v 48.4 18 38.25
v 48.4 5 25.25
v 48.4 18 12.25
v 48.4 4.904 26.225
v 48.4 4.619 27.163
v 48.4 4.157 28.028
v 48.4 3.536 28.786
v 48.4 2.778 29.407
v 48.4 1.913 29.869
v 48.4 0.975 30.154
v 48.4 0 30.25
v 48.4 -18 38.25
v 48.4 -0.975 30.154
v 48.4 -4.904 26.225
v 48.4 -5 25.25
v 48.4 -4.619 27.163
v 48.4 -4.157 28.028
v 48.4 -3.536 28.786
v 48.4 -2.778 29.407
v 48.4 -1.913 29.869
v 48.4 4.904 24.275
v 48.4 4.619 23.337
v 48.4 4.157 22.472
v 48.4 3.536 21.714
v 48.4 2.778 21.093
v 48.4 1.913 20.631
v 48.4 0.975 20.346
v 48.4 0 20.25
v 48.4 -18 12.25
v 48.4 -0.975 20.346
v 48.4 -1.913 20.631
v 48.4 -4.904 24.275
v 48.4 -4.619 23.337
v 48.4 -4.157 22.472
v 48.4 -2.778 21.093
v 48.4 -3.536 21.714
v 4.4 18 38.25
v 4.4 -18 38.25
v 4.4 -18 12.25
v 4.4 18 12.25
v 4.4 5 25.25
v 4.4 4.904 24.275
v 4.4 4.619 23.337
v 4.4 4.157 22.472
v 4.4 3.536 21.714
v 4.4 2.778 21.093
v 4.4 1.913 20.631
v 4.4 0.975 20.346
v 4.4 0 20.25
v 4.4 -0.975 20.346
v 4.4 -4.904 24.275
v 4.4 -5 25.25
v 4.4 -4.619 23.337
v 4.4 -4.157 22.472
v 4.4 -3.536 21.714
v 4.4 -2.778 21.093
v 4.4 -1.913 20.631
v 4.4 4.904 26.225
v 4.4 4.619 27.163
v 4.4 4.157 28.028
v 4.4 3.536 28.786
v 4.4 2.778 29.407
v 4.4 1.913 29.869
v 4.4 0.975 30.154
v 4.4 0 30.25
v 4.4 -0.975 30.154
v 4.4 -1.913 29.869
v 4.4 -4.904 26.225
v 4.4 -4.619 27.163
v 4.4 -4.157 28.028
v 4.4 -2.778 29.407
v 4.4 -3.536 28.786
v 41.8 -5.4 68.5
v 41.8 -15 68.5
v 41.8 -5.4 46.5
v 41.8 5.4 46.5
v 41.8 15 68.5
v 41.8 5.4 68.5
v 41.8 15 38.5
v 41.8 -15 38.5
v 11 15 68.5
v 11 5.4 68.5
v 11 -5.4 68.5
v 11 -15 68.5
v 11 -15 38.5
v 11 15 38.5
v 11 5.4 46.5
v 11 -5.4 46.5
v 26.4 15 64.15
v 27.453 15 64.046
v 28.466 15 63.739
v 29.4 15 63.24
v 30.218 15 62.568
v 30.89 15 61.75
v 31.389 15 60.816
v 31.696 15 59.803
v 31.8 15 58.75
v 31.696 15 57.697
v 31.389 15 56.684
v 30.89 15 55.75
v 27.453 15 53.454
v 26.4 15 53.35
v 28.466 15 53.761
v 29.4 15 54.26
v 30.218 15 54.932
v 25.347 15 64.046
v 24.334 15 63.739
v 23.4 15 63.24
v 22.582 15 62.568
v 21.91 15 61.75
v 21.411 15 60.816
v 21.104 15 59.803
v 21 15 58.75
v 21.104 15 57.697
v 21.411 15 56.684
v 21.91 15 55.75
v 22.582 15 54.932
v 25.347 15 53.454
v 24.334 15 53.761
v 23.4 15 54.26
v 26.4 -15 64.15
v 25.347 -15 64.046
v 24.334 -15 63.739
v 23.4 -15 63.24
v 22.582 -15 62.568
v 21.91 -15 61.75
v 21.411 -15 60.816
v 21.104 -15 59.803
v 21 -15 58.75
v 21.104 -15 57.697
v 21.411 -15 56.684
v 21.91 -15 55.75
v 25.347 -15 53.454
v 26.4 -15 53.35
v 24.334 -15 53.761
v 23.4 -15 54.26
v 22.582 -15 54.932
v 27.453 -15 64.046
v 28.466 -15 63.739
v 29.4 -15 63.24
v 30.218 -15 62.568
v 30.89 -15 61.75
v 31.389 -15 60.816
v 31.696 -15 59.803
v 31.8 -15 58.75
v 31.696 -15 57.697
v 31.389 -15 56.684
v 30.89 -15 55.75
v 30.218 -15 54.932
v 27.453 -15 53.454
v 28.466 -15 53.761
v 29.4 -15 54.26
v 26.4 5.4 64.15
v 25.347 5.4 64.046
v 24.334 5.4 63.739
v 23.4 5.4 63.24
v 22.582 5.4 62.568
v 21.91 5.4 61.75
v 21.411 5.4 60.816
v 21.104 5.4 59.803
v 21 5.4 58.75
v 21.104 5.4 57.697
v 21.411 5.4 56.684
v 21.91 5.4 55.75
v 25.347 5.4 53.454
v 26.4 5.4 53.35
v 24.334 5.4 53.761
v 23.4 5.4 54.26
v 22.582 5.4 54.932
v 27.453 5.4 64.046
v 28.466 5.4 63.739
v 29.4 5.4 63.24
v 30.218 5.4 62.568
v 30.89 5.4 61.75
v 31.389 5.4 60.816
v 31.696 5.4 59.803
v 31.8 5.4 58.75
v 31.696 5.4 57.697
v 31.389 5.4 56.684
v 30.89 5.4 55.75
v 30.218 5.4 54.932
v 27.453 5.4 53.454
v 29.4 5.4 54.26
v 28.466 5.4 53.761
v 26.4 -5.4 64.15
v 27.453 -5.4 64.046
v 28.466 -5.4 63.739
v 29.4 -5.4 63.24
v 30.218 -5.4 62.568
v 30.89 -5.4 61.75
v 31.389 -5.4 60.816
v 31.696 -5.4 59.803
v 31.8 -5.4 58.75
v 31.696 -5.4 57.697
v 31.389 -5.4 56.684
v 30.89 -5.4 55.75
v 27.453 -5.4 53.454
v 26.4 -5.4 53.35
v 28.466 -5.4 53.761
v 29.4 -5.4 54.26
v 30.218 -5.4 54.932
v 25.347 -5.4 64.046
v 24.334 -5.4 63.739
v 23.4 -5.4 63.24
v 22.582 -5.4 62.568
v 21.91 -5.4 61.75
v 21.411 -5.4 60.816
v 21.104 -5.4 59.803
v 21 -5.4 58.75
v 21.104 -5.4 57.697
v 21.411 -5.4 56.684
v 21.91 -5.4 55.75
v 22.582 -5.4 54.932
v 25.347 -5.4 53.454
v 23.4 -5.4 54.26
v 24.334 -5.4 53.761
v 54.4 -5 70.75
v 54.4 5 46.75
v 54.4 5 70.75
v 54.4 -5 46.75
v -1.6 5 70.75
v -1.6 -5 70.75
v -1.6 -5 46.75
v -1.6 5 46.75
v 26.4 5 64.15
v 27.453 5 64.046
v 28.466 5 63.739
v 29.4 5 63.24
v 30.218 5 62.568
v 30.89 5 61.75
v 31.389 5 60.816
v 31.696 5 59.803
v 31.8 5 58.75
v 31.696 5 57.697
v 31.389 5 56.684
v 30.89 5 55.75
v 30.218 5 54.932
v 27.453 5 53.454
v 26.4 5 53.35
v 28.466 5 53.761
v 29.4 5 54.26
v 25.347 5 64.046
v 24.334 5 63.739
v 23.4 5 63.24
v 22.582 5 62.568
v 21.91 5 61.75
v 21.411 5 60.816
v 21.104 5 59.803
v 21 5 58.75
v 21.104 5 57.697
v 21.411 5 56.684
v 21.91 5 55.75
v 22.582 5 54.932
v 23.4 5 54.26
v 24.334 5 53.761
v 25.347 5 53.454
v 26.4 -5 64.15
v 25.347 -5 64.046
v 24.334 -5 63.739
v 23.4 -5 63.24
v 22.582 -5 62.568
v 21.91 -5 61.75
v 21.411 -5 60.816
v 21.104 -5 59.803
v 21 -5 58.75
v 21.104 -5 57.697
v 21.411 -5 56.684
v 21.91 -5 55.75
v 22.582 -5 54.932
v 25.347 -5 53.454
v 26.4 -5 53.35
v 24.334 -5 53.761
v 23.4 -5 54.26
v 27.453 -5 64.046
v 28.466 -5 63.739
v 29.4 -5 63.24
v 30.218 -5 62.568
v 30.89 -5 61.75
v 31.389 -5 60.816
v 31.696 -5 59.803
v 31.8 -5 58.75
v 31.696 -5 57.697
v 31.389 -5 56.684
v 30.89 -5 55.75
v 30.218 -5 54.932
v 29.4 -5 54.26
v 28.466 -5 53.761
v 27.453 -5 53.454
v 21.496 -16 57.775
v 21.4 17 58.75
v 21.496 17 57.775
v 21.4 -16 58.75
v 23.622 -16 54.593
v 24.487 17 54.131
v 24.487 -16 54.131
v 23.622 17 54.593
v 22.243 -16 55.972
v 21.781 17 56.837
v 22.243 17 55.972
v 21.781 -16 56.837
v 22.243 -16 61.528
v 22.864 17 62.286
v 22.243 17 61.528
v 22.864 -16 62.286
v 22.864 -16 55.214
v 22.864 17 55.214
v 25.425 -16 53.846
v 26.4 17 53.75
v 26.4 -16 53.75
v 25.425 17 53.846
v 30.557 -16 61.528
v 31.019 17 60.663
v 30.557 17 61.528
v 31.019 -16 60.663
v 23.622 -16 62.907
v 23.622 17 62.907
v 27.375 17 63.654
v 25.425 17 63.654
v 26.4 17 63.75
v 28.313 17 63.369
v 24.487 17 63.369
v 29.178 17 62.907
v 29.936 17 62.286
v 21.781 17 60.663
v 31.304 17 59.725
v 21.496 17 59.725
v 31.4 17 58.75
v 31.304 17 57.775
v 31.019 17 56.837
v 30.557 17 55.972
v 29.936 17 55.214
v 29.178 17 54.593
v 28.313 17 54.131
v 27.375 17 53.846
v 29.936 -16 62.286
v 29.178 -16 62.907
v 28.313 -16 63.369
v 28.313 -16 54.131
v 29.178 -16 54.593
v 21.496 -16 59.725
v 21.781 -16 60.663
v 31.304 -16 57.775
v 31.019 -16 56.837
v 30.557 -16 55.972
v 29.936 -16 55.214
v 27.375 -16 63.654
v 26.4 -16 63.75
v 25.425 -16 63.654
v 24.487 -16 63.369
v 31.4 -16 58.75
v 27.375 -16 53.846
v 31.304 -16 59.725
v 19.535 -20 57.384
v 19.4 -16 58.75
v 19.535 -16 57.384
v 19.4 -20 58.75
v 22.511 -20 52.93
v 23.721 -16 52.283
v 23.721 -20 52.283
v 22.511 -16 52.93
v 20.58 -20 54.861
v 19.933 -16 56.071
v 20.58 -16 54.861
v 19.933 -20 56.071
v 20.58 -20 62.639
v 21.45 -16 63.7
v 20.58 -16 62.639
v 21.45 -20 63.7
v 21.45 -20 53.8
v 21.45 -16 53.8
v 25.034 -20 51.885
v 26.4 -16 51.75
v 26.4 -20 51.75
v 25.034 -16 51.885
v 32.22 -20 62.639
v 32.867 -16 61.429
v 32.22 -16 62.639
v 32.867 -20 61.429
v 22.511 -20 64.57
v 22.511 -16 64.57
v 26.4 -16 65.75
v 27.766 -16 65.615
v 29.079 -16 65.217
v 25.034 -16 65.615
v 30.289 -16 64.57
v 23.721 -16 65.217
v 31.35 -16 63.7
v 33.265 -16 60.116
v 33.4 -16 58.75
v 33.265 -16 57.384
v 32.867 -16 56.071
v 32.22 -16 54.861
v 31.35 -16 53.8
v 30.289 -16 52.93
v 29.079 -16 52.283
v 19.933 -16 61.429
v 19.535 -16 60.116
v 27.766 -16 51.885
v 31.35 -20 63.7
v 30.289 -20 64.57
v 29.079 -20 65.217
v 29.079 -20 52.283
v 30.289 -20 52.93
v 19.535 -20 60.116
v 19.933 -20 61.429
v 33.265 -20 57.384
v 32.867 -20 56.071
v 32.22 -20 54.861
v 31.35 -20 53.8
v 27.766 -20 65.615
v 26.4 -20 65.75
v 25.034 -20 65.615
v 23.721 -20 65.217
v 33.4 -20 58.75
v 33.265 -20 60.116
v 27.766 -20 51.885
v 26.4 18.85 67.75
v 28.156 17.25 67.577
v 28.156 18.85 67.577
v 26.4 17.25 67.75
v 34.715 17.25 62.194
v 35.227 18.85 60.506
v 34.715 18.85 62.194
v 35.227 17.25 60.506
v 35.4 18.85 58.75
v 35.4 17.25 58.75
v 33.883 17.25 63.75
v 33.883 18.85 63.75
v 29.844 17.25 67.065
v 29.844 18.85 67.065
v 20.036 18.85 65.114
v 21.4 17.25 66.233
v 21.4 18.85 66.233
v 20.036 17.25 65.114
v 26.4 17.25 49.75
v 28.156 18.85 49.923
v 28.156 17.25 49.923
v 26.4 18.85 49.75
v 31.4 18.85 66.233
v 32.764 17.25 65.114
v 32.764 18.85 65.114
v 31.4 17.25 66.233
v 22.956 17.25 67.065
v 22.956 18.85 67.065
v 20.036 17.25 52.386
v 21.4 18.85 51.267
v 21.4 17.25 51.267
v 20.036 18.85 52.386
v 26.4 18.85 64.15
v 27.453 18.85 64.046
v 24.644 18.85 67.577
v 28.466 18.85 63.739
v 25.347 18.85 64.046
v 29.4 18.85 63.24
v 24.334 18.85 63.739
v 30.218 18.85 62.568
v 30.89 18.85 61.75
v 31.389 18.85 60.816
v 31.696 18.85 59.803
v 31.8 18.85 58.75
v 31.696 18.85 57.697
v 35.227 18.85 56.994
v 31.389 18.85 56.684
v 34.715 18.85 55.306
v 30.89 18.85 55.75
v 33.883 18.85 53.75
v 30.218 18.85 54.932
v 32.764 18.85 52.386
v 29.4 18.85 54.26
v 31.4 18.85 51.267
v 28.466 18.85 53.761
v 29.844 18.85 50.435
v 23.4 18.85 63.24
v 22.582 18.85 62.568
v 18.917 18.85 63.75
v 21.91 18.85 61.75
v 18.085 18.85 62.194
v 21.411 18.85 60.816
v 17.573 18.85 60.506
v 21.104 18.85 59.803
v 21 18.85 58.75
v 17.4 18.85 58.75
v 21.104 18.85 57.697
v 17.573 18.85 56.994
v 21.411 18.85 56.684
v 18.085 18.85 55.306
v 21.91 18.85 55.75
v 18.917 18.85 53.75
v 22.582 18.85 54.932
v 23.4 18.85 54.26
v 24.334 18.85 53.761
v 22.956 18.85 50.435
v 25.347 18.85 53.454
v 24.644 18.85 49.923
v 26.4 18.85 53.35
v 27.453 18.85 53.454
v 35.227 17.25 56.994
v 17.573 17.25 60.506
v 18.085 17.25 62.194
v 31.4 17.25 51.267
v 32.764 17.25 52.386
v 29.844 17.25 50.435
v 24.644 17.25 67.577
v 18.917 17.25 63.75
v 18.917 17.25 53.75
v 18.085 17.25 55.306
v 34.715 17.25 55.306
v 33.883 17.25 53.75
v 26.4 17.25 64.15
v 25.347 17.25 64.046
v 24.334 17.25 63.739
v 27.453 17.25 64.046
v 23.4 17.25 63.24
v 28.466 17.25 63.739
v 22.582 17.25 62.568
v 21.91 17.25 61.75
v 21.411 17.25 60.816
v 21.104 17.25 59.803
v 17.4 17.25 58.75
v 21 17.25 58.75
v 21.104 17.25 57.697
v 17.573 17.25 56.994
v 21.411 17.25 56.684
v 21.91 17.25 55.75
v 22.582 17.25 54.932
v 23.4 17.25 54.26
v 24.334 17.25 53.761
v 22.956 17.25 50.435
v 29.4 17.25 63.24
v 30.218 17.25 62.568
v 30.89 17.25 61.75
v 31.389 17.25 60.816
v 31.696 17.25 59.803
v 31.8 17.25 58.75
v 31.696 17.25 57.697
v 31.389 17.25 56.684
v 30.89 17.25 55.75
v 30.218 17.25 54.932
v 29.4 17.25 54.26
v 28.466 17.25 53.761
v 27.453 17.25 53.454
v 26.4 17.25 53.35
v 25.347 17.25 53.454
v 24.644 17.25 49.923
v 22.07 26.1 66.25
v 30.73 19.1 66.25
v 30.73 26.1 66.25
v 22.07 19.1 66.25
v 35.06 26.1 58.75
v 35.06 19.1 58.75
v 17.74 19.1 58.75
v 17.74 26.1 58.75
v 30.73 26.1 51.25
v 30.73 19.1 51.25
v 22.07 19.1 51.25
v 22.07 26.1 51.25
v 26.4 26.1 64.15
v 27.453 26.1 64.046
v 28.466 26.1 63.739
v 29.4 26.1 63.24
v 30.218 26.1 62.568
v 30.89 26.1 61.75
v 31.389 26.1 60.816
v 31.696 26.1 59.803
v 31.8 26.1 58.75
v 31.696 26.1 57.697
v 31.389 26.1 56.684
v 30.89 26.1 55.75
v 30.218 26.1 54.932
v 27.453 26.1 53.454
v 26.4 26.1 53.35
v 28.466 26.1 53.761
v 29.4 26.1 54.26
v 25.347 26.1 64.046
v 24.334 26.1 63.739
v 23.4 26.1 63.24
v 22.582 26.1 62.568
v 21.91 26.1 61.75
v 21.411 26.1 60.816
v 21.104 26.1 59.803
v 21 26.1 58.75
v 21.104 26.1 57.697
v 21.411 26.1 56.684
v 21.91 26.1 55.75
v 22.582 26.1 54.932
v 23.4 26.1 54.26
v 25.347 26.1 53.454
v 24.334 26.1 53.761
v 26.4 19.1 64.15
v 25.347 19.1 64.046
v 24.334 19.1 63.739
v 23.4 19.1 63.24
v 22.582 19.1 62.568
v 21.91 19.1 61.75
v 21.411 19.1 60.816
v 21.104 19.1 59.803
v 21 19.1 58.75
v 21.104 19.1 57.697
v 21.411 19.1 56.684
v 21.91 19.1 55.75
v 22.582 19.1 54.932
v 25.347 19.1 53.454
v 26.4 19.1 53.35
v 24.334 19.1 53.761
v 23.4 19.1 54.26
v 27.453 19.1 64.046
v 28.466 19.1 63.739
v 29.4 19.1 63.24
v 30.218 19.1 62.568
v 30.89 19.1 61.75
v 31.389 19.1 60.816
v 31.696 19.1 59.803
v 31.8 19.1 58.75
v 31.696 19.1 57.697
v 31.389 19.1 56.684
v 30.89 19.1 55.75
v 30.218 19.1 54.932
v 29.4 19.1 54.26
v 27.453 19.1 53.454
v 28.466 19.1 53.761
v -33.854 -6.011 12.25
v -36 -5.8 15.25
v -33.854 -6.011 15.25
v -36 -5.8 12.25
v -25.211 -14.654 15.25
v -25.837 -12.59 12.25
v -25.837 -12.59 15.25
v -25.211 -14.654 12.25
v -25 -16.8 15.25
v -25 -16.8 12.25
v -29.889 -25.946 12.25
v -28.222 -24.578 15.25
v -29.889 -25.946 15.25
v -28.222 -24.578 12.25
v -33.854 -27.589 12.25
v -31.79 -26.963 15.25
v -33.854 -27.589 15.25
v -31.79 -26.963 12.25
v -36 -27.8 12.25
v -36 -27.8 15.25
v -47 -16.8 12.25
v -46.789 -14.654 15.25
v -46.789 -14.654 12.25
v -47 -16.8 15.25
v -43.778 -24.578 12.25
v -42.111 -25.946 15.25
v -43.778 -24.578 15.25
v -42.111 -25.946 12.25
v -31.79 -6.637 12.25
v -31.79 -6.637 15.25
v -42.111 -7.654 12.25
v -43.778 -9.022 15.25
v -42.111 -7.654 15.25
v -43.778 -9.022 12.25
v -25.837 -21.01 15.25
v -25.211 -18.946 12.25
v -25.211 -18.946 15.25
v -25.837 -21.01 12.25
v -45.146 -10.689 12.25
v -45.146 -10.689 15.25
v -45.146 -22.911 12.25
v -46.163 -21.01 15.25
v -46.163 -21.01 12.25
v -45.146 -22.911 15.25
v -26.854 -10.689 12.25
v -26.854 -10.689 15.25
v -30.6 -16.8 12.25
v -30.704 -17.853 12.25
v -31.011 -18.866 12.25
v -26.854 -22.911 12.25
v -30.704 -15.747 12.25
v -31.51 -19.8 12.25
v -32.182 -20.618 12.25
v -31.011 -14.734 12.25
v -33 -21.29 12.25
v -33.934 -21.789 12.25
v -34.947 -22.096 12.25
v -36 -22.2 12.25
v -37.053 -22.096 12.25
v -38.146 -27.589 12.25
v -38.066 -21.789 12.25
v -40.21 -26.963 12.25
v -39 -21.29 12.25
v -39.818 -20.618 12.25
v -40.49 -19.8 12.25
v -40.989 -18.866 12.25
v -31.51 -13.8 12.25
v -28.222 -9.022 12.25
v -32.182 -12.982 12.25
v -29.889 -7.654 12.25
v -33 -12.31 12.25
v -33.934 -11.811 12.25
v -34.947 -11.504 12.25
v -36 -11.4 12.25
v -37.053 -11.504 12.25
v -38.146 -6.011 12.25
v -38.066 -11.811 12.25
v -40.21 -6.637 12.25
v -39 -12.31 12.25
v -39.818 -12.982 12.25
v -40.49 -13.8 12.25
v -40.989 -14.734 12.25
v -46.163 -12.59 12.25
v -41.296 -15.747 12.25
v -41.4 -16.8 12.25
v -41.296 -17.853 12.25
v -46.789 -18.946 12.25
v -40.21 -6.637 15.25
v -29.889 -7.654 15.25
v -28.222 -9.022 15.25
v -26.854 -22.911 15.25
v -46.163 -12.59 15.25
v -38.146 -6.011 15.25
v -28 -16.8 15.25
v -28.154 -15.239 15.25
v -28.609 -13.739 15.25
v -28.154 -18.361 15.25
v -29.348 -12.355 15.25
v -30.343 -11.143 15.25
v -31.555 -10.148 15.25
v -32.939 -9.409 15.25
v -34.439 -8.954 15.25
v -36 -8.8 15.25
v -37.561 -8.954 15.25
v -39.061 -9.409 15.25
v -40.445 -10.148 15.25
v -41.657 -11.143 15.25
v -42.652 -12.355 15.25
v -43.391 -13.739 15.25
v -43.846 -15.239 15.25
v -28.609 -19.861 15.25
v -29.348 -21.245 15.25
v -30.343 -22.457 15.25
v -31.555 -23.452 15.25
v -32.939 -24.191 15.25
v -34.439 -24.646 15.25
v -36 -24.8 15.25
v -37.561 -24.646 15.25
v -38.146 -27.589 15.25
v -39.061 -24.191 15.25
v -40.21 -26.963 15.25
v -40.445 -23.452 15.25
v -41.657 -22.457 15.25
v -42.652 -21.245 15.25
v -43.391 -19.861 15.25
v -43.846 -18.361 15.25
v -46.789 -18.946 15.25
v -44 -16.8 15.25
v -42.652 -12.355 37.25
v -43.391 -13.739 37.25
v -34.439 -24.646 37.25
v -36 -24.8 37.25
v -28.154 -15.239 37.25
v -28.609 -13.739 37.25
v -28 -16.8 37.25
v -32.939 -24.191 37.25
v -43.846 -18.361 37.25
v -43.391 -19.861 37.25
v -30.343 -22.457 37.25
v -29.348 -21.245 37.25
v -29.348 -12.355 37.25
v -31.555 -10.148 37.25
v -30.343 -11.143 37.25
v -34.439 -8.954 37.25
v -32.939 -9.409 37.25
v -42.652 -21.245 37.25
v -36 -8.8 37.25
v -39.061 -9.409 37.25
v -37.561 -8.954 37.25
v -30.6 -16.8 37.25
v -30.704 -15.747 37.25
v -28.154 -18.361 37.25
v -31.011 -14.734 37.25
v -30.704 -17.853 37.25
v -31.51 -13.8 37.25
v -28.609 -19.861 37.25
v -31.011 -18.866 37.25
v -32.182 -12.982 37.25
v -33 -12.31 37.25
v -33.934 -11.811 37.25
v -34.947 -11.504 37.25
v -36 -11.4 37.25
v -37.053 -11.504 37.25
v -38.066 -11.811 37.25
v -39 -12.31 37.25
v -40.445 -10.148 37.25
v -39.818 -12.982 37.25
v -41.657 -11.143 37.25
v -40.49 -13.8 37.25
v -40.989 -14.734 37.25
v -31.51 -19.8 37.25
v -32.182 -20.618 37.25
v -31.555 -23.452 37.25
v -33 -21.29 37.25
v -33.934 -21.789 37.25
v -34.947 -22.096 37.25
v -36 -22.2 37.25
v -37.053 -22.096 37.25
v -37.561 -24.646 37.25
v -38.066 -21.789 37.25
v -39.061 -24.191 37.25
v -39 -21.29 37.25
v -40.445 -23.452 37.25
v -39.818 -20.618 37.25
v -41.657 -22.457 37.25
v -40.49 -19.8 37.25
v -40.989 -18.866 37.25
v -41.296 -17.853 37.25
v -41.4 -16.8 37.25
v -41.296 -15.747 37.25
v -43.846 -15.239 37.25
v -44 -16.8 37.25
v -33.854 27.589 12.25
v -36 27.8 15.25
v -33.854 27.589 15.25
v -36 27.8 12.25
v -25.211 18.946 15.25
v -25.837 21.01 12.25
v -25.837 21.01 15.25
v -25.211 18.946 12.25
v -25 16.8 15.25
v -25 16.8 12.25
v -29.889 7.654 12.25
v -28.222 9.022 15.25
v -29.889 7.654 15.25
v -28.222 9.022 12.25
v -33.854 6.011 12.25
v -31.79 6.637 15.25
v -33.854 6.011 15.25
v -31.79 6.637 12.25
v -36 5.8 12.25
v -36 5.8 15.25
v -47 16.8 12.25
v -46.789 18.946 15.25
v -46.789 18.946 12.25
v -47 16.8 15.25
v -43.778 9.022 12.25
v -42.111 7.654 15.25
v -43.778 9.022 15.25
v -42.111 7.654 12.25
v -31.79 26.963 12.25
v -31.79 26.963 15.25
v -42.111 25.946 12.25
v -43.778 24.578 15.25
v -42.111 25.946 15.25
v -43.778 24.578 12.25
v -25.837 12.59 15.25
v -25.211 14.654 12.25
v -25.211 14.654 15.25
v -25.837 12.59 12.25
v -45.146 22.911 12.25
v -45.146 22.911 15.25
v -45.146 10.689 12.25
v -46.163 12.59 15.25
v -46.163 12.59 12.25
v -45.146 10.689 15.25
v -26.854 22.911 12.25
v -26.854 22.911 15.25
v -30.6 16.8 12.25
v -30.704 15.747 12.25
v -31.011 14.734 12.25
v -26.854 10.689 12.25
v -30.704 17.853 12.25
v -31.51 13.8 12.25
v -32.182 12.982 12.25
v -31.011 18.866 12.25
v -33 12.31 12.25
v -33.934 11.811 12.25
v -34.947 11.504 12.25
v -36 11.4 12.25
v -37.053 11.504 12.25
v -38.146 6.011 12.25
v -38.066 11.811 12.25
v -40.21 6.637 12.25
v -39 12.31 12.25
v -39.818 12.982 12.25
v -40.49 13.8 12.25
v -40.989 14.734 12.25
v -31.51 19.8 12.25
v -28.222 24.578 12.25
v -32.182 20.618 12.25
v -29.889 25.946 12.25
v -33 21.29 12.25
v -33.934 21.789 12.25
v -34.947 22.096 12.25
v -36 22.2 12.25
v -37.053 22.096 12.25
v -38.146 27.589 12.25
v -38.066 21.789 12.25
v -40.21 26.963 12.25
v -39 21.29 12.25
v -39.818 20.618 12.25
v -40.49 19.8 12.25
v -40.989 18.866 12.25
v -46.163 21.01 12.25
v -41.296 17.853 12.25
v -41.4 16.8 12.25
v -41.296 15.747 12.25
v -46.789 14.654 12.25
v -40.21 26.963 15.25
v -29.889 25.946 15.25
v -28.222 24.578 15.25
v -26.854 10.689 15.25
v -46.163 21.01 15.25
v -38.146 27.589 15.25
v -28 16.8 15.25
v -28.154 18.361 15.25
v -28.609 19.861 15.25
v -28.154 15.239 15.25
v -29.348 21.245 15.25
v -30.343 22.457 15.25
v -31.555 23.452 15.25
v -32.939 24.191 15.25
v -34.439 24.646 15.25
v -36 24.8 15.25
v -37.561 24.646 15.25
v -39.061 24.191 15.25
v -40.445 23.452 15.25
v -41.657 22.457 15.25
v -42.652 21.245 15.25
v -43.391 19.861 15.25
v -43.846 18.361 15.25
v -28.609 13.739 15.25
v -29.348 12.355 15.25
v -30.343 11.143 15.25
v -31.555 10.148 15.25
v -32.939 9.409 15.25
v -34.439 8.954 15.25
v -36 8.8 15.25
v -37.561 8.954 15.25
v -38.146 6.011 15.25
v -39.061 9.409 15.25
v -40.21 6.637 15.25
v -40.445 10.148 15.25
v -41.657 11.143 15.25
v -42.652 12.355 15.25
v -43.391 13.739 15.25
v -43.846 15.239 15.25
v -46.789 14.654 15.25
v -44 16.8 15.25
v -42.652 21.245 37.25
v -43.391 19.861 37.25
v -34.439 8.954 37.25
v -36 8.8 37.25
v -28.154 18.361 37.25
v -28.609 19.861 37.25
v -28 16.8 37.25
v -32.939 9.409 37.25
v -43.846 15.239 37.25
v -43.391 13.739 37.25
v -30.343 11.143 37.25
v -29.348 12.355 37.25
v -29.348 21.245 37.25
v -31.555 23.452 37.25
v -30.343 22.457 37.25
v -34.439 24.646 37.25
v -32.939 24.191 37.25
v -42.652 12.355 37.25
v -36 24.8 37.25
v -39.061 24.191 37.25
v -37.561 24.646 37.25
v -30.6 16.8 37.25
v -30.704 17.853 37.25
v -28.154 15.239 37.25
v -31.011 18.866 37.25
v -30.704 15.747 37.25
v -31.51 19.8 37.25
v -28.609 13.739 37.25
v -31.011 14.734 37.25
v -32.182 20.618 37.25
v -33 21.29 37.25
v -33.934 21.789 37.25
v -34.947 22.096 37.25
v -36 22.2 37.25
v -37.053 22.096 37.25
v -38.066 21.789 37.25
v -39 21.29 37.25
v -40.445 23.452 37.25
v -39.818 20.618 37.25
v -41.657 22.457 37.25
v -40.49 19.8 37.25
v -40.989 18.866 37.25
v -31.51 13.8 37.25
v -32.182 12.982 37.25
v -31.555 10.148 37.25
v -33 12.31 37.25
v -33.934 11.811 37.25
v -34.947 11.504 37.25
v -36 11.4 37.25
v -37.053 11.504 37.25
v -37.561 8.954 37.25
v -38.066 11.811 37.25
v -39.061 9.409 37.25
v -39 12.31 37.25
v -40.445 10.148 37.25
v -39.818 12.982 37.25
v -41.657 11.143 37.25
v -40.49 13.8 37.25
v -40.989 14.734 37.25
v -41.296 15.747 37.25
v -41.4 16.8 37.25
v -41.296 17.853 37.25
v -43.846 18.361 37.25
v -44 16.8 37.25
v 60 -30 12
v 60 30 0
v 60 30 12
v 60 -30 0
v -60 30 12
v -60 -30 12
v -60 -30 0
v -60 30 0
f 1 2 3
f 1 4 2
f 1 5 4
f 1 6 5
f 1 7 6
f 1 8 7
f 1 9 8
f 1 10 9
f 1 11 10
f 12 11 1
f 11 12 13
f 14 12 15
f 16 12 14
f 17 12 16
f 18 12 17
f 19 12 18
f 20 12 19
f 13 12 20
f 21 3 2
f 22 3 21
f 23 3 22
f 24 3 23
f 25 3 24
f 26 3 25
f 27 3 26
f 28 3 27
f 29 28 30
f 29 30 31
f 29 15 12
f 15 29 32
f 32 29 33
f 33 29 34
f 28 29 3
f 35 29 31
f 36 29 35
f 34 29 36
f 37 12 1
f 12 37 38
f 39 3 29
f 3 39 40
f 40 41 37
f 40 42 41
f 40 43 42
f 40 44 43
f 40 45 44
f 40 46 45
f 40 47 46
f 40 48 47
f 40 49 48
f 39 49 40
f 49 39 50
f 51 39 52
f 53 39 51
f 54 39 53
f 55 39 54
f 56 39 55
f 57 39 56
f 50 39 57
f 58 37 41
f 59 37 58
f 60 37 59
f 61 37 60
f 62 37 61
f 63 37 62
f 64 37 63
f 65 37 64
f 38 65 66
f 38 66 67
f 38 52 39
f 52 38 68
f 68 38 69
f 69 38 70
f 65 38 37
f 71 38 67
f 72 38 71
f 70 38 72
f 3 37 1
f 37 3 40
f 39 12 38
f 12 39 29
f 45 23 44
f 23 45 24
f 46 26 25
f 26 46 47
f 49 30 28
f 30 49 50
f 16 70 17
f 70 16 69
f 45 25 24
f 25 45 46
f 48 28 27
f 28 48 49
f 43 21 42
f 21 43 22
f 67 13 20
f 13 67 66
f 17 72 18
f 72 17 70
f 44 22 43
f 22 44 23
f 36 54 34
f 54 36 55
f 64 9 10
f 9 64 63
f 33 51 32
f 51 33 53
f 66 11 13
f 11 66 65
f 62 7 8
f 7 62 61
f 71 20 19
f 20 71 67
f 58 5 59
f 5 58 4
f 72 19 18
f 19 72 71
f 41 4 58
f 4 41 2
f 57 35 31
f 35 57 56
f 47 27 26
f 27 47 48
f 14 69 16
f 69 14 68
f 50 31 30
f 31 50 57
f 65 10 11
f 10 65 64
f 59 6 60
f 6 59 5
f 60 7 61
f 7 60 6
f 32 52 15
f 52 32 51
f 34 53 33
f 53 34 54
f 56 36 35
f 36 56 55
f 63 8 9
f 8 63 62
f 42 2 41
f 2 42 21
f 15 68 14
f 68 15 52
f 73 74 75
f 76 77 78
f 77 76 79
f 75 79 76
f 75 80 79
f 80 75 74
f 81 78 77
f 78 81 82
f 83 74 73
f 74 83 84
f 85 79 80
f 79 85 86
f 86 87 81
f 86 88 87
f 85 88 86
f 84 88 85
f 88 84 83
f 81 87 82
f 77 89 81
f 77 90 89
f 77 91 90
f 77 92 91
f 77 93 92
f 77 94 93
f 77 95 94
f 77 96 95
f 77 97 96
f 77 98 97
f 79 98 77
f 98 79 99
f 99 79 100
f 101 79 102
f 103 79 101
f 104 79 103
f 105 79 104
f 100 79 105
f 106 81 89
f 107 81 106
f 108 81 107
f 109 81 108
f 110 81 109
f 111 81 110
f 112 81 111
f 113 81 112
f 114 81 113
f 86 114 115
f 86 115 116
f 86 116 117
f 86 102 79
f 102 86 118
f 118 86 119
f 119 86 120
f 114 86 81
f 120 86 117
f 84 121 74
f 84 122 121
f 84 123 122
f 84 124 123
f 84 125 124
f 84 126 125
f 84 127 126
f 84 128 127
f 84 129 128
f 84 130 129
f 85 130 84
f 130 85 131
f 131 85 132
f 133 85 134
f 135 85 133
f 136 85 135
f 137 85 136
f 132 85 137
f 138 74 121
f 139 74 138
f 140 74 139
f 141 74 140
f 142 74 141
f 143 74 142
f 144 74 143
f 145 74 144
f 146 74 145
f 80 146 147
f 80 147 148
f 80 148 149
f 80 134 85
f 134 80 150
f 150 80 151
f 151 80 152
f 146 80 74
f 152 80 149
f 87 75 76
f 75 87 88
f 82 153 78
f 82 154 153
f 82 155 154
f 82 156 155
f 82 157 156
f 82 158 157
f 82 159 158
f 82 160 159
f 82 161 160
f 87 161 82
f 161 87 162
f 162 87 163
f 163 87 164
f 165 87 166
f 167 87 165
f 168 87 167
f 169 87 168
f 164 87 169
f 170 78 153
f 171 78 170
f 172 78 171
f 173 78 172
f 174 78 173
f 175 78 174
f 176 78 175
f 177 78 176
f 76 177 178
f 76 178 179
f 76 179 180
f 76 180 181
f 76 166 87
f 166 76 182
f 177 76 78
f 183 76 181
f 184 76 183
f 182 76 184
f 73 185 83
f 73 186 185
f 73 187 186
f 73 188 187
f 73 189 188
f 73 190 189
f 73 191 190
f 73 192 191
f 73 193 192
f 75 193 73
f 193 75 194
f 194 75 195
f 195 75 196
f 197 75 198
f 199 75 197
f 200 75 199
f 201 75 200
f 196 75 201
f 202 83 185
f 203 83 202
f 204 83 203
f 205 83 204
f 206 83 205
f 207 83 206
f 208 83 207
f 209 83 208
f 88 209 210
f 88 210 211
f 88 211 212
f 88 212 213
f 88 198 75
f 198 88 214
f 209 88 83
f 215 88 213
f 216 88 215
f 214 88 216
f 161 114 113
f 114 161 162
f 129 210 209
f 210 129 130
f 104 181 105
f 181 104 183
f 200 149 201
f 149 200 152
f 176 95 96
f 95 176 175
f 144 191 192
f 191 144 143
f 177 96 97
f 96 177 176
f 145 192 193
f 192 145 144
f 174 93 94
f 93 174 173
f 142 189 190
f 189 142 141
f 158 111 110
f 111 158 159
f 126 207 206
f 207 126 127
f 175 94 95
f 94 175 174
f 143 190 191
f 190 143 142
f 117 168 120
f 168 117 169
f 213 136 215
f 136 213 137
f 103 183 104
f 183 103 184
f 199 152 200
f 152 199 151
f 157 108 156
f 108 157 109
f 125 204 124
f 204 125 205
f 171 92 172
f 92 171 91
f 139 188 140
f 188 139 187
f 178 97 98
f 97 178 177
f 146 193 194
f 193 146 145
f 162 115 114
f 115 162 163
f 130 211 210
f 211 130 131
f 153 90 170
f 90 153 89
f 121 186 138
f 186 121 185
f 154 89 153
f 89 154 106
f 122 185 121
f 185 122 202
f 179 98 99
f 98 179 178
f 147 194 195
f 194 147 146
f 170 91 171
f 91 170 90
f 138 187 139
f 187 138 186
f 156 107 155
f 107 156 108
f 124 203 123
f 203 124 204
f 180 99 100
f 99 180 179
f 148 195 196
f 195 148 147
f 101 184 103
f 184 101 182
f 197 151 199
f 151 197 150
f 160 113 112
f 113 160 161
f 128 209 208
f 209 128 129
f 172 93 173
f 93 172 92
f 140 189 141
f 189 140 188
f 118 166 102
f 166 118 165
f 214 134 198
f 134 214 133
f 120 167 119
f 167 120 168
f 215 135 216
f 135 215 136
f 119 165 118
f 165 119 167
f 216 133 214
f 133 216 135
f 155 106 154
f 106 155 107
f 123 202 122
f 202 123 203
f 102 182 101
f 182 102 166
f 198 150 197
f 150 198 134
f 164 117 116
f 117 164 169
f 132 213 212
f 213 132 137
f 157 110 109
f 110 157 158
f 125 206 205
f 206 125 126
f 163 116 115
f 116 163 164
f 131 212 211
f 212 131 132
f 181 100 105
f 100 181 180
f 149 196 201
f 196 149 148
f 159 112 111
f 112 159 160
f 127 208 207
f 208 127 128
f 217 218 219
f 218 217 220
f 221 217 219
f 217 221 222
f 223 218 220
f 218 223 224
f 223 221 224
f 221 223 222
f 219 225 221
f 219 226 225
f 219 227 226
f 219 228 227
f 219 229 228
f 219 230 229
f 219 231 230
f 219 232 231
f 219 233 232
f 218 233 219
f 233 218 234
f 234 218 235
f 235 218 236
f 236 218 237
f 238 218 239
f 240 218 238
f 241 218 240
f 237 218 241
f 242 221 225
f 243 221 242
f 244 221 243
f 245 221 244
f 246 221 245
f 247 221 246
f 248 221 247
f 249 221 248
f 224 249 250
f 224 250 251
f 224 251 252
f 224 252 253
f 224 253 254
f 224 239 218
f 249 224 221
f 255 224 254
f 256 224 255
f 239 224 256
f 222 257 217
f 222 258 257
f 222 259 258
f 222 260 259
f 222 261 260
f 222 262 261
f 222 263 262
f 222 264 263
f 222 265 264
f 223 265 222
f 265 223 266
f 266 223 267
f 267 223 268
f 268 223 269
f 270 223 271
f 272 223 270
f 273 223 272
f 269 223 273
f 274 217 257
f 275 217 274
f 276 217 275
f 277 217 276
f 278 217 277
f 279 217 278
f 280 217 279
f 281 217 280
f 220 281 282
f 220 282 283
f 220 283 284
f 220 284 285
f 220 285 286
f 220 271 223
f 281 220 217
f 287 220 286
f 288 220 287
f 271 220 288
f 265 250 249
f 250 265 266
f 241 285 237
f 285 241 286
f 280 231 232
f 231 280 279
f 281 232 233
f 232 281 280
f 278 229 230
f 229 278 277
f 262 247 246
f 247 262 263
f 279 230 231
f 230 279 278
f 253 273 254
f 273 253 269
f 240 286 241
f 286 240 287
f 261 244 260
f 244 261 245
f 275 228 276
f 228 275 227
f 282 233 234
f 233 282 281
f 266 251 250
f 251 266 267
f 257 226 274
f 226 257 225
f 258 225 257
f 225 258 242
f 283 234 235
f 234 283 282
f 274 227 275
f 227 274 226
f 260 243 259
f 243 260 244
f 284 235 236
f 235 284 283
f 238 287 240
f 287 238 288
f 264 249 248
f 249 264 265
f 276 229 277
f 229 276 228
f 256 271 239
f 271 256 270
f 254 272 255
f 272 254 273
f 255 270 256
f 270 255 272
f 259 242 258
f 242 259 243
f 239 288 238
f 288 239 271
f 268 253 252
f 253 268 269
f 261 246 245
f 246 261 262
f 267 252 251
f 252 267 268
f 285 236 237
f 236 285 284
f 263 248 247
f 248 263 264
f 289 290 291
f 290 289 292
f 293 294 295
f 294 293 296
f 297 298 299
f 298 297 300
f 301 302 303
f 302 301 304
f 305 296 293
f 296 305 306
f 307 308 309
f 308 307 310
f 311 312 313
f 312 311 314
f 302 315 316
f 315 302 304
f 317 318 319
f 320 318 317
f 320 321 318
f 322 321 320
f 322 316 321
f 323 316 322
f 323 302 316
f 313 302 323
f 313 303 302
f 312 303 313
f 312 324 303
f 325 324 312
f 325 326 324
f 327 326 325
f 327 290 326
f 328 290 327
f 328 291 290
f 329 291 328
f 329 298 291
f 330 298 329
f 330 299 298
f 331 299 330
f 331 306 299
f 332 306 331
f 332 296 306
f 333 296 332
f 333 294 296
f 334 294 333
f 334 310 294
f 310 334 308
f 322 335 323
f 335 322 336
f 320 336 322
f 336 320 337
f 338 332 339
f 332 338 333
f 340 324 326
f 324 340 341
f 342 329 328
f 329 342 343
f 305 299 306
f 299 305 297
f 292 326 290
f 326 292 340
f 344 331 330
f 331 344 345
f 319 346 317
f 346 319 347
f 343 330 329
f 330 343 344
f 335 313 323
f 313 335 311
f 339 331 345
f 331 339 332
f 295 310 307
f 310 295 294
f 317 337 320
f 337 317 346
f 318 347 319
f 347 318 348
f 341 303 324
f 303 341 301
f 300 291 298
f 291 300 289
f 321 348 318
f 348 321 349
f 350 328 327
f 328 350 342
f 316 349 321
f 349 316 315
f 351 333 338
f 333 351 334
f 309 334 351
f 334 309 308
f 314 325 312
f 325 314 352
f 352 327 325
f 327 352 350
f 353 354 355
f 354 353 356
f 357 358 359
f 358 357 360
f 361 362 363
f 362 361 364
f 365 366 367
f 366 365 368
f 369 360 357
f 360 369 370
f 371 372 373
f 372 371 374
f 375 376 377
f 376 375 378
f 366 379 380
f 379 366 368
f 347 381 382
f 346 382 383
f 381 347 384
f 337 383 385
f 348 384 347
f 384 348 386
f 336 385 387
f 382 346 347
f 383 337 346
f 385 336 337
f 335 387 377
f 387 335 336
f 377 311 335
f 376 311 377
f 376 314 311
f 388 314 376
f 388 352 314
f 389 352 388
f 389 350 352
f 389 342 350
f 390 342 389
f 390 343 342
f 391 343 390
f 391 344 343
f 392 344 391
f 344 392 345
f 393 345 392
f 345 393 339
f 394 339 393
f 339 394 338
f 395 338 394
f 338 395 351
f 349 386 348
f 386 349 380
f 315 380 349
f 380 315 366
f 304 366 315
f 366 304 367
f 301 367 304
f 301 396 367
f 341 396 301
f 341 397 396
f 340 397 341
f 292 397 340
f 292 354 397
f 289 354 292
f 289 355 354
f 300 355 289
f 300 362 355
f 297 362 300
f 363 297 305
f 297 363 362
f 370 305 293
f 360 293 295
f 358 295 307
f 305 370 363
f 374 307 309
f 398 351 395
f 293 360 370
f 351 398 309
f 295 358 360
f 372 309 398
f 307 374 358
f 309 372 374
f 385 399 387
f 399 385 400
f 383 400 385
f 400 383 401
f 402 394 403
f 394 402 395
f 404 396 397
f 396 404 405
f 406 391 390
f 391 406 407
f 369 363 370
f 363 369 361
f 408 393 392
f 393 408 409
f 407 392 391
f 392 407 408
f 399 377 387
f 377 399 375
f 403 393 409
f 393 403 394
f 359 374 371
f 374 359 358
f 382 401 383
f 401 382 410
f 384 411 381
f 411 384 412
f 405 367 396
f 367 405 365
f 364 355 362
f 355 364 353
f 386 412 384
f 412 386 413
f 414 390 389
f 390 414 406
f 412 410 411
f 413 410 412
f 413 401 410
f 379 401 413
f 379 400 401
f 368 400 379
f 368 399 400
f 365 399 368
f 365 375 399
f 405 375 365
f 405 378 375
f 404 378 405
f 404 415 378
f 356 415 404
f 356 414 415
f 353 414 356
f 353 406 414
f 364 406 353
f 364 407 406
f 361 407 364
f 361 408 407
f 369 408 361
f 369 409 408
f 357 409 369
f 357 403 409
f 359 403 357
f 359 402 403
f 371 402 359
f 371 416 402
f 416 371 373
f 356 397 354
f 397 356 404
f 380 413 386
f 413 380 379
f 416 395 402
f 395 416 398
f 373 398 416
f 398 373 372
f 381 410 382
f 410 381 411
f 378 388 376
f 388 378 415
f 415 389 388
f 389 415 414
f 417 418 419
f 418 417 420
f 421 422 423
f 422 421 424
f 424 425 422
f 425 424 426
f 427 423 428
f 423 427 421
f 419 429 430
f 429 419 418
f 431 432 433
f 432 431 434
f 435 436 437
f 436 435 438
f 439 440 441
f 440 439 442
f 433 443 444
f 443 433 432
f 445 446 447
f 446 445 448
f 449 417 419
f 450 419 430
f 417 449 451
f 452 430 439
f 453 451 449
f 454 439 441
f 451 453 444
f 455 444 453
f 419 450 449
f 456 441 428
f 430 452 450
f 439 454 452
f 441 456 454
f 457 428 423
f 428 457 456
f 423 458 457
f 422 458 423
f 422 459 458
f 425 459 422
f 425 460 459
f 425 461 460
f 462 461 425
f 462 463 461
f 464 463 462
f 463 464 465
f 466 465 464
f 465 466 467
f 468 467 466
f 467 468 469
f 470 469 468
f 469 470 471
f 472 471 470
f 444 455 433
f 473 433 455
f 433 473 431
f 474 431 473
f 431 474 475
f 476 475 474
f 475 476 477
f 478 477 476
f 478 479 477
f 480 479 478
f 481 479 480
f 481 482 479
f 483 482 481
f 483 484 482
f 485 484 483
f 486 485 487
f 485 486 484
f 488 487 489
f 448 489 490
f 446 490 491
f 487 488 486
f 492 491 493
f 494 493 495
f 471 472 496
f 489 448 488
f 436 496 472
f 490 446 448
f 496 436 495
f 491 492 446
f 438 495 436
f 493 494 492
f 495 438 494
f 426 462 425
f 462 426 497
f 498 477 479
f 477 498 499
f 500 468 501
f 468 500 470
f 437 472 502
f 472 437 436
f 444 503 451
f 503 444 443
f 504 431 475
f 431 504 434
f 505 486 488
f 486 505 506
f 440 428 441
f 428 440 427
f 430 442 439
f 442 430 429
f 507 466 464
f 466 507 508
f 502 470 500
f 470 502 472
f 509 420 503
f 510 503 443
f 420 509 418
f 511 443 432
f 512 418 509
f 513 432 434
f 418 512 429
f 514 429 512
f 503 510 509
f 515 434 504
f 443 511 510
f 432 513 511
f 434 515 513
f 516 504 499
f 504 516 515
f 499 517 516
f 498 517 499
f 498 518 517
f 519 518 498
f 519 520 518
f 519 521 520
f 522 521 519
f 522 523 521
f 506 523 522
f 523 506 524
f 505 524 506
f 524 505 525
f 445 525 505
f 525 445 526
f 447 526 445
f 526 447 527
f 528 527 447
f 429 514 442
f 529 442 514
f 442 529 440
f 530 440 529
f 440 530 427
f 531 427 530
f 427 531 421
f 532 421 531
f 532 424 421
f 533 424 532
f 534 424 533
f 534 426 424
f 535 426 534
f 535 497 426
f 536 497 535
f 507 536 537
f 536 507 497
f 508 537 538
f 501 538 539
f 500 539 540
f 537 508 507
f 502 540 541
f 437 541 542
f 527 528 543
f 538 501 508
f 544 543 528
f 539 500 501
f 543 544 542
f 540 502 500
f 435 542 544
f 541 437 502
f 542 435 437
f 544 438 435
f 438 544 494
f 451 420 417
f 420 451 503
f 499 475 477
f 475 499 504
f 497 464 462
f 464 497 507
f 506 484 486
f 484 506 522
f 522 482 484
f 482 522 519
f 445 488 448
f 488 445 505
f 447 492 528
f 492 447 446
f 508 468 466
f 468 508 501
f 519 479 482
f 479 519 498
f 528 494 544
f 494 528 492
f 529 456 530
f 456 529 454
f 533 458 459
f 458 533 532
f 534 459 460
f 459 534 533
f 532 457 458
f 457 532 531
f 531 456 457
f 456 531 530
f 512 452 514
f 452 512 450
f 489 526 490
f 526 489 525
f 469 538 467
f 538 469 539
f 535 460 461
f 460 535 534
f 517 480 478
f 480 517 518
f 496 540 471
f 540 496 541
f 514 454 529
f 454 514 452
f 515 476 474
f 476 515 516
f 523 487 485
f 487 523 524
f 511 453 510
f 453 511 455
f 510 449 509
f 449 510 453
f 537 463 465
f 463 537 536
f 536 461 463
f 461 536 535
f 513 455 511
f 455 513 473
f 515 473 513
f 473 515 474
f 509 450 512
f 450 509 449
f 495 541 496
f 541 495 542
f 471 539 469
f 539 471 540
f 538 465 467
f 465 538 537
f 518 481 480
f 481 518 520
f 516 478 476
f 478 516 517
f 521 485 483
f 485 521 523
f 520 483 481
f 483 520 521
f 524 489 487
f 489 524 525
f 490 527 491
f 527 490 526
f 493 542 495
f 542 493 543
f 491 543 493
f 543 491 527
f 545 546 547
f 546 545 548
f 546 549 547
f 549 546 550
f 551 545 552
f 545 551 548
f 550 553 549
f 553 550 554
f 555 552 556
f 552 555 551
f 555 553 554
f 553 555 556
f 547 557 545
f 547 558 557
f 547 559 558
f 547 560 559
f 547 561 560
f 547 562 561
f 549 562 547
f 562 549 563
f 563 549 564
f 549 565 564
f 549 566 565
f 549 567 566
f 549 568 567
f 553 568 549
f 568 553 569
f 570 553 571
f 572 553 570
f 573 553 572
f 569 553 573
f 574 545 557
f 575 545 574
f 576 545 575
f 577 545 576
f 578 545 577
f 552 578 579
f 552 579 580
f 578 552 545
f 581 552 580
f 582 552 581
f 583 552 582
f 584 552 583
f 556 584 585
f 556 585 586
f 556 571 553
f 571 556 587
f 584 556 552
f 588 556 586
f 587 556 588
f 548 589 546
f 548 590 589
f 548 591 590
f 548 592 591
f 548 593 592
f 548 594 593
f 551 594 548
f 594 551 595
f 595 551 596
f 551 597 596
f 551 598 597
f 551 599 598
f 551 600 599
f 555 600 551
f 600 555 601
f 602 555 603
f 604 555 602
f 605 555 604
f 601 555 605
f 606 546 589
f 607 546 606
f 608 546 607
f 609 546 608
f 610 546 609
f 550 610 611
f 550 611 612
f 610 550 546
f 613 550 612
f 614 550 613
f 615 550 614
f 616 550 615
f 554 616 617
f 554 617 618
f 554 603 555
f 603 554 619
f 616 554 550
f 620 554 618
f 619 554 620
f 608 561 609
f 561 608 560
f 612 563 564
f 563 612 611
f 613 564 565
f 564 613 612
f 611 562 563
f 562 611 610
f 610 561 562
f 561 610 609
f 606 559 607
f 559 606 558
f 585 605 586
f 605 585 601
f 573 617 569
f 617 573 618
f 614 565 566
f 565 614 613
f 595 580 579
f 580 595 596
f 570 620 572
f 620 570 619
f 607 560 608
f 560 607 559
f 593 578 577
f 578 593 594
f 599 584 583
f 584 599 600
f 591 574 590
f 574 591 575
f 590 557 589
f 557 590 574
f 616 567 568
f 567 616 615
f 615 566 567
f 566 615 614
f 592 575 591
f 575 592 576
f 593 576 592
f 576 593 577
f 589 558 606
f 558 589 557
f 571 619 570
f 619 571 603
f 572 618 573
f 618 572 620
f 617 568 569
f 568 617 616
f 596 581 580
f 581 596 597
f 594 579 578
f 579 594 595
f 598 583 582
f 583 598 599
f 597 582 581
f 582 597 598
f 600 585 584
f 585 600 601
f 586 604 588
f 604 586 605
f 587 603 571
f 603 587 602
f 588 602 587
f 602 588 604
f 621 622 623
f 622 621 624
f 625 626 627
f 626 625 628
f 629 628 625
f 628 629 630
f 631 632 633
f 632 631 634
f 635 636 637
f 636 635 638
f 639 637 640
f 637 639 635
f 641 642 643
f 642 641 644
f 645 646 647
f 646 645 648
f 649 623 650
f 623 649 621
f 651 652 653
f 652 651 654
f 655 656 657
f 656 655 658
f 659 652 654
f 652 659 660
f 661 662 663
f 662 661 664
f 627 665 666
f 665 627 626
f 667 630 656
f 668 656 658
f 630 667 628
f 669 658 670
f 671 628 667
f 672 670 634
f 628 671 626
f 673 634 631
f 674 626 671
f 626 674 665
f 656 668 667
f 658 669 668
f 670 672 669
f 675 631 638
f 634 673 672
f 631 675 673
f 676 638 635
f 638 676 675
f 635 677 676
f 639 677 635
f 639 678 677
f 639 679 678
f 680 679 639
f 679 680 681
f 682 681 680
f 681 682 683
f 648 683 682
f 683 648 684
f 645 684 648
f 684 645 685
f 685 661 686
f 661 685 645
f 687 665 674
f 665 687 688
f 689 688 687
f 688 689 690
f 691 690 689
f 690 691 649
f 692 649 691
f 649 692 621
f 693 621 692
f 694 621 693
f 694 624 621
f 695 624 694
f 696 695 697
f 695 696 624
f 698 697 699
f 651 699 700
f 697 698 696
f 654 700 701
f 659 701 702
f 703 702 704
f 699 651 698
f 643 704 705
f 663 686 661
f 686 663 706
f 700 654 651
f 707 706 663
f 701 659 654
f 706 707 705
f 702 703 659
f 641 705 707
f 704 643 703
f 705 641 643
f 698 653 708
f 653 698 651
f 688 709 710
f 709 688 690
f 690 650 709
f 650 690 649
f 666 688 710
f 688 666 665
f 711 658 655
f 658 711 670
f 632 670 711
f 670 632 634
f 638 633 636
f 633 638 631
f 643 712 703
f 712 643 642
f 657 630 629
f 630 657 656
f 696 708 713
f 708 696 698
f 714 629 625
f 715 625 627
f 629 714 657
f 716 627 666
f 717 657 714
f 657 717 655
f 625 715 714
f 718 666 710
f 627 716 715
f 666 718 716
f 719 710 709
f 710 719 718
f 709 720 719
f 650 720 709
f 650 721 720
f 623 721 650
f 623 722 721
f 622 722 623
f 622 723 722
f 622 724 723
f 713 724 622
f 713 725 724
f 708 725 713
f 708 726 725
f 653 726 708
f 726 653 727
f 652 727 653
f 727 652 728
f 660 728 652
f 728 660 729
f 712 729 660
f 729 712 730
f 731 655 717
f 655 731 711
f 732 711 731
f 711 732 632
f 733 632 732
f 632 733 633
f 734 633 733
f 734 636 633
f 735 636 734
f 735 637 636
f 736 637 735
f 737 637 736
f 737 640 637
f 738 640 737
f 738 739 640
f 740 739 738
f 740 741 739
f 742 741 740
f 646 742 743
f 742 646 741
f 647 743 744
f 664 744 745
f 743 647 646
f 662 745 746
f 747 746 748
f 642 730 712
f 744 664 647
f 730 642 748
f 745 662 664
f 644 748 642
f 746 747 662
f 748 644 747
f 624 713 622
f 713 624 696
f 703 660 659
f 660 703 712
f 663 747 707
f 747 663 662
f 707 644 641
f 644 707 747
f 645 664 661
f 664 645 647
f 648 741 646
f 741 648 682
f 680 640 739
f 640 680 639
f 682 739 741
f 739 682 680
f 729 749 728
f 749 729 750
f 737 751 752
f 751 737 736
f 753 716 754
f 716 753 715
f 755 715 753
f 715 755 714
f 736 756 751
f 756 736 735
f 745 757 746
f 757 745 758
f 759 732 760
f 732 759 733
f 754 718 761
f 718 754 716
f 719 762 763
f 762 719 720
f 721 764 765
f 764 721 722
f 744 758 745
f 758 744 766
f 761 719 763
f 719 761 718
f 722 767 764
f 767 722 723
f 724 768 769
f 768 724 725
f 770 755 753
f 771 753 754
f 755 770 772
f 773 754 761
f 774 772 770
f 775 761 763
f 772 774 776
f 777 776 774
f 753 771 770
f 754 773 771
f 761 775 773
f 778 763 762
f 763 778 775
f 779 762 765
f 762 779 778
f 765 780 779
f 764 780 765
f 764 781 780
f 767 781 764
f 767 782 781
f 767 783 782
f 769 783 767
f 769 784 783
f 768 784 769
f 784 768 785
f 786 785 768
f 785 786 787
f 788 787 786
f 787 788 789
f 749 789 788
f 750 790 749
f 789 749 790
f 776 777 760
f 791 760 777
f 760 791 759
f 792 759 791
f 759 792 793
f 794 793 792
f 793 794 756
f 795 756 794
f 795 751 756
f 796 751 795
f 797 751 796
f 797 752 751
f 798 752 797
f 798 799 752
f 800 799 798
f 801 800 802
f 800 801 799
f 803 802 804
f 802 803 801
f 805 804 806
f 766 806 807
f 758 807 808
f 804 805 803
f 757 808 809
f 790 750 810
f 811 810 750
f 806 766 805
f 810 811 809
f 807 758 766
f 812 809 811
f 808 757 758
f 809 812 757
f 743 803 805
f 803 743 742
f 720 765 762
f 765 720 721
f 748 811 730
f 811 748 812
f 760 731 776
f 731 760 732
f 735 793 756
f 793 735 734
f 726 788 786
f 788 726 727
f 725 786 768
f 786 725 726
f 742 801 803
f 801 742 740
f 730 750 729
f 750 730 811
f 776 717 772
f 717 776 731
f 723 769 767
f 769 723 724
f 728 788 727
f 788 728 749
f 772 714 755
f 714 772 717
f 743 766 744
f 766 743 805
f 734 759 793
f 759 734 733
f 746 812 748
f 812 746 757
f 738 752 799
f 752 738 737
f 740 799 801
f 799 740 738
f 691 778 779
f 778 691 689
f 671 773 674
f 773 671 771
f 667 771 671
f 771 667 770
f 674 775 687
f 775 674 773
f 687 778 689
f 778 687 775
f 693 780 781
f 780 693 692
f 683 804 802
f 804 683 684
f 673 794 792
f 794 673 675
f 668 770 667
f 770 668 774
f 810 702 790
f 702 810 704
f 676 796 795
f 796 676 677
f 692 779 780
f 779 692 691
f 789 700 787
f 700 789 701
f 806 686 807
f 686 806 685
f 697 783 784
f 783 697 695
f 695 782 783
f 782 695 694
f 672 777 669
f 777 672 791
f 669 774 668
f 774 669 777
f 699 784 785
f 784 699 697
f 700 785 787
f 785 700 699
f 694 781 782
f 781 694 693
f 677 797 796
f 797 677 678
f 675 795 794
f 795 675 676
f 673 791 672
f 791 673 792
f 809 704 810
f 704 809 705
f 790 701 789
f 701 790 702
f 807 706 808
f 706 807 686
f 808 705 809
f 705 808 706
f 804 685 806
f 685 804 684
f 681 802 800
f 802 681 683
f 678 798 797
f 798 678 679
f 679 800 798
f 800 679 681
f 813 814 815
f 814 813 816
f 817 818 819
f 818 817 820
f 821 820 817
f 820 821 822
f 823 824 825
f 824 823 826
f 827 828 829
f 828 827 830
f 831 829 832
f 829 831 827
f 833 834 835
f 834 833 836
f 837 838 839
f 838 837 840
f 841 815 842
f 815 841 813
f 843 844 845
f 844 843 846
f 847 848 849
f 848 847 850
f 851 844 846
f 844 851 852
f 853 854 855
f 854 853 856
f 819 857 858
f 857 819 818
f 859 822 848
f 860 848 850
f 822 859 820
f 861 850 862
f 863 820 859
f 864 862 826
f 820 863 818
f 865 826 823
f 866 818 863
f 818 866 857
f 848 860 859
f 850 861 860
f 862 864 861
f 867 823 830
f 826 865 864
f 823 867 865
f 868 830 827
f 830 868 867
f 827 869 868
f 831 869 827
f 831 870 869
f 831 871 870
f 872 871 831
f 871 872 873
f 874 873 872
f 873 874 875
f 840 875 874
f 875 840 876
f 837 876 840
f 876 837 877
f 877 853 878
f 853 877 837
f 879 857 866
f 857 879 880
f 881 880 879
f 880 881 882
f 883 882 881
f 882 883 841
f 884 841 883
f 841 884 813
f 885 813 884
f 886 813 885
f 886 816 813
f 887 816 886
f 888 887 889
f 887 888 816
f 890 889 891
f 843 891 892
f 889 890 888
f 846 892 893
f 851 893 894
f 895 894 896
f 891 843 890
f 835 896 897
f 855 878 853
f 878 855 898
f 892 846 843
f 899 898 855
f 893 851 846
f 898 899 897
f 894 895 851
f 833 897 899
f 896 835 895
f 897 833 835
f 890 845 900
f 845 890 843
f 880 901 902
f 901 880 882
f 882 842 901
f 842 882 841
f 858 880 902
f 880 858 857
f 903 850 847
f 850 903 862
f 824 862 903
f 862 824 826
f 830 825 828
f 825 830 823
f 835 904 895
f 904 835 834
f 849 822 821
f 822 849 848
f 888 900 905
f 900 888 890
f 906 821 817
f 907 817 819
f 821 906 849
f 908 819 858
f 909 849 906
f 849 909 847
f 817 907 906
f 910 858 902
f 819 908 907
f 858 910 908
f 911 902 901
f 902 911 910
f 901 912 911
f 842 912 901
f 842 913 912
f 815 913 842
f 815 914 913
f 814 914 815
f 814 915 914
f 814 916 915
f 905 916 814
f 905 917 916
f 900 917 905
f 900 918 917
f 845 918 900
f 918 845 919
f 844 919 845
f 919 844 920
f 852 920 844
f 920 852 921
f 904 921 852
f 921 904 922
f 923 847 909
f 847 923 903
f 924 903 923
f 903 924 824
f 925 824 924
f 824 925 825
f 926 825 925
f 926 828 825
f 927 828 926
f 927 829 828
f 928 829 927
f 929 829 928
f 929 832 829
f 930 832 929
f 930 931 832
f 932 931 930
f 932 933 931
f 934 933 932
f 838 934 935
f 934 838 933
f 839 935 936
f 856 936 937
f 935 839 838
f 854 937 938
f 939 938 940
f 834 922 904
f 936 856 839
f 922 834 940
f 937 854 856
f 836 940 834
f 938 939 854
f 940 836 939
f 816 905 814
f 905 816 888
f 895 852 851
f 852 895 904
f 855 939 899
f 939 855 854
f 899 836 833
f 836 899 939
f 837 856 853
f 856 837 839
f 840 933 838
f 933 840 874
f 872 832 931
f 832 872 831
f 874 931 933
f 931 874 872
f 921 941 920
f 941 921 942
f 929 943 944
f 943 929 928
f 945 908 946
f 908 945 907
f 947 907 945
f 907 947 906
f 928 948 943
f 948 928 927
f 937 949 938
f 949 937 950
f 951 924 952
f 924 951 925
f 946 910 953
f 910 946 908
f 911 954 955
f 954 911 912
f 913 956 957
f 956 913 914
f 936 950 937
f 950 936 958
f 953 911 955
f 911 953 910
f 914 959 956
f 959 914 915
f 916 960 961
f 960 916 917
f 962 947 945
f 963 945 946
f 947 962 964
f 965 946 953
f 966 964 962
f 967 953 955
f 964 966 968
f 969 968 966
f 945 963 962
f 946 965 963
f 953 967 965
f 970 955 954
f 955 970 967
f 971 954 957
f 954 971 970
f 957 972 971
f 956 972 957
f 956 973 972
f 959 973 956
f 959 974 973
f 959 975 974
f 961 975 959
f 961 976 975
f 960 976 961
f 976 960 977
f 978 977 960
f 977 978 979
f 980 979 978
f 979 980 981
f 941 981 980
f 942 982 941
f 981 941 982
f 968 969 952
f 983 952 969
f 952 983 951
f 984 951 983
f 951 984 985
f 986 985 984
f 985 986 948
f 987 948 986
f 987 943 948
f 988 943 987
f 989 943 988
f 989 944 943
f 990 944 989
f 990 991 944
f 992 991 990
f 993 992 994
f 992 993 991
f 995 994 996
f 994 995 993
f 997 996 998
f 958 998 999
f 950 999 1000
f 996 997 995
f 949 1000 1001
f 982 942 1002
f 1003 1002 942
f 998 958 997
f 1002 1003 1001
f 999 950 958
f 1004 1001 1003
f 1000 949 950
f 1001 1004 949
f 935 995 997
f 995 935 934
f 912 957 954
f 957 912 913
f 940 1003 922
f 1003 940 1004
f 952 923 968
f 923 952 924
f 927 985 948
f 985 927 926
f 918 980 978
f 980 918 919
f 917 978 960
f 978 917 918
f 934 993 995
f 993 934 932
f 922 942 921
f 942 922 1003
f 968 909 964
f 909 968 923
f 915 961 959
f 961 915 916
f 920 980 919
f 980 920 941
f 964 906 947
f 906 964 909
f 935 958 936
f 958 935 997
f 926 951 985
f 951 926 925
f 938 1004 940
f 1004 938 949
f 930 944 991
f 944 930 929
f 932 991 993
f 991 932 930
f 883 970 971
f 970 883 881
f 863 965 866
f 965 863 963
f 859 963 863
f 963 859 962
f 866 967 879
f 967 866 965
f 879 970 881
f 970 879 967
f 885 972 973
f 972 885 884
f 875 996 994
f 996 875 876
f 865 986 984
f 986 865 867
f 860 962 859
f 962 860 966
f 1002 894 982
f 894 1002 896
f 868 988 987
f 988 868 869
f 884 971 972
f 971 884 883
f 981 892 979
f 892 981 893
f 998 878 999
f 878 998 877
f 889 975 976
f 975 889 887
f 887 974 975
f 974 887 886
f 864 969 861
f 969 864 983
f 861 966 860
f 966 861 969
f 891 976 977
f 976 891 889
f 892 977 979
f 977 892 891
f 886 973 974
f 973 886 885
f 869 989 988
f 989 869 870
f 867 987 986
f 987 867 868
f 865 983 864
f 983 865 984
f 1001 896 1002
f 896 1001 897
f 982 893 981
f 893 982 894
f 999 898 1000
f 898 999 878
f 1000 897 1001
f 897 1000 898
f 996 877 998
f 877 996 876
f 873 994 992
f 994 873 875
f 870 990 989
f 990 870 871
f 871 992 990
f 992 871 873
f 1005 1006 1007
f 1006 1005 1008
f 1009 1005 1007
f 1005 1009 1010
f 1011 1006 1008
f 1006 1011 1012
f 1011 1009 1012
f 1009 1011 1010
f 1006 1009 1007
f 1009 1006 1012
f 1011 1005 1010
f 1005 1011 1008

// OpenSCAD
$fn = 32;

// ------------------------------------------------------------------------
// Indexing jig: plate 120 x 60 mm, pin d10
// Every part is its own module, assembly() places every instance.
// ------------------------------------------------------------------------

// --- part 1 ---
module jig_plate() {
  difference() {
    translate([-60, -30, 0]) cube([120, 60, 12]);
  }
}

// --- part 2 ---
module locator_block() {
  difference() {
    translate([-22, -18, 0]) cube([44, 36, 26]);
    translate([0, 0, 13]) rotate([0, 90, 0]) cylinder(h = 46, d = 10, center = true);
  }
}

// --- part 3 ---
module index_fork() {
  difference() {
    translate([-15.4, -15, 0]) cube([30.8, 30, 30]);
    translate([-16.4, -5.4, 8]) cube([32.8, 10.8, 23]);
    translate([0, 0, 20.25]) rotate([90, 0, 0]) cylinder(h = 32, d = 10.8, center = true);
  }
}

// --- part 4 ---
module index_arm() {
  difference() {
    translate([-28, -5, 0]) cube([56, 10, 24]);
    translate([0, 0, 12]) rotate([90, 0, 0]) cylinder(h = 12, d = 10.8, center = true);
  }
}

// --- part 5 ---
module index_pin() {
  rotate([0, 90, 0]) cylinder(h = 34, d = 10, center = true);
  translate([-20, 0, 0]) rotate([0, 90, 0]) cylinder(h = 4, d = 14);
}

// --- part 6 ---
module pin_washer() {
  difference() {
      translate([0, 0, 0]) cylinder(h = 1.6, d = 18);
      translate([0, 0, -1]) cylinder(h = 3.6, d = 10.8);
    }
}

// --- part 7 ---
module lock_nut() {
  difference() {
    linear_extrude(height = 7) polygon(points = [[8.66, 0], [4.33, 7.5], [-4.33, 7.5], [-8.66, 0], [-4.33, -7.5], [4.33, -7.5]]);
    translate([0, 0, -1]) cylinder(h = 9, d = 10.8);
  }
}

// --- part 8 ---
module guide_bush_a() {
  difference() {
    union() {
      cylinder(h = 3, d = 22);
      translate([0, 0, 3]) cylinder(h = 22, d = 16);
    }
    translate([0, 0, -1]) cylinder(h = 27, d = 10.8);
  }
}

// --- part 9 ---
module guide_bush_b() {
  difference() {
    union() {
      cylinder(h = 3, d = 22);
      translate([0, 0, 3]) cylinder(h = 22, d = 16);
    }
    translate([0, 0, -1]) cylinder(h = 27, d = 10.8);
  }
}

// --- assembly ---
module assembly() {
  color([0.80, 0.24, 0.20]) translate([0, 0, 0]) rotate([0, 0, 0]) jig_plate();
  color([0.20, 0.45, 0.75]) translate([26.4, 0, 12.25]) rotate([0, 0, 0]) locator_block();
  color([0.25, 0.62, 0.32]) translate([26.4, 0, 38.5]) rotate([0, 0, 0]) index_fork();
  color([0.92, 0.70, 0.18]) translate([26.4, 0, 46.75]) rotate([0, 0, 0]) index_arm();
  color([0.58, 0.35, 0.70]) translate([26.4, 0, 58.75]) rotate([0, 0, 90]) index_pin();
  color([0.16, 0.66, 0.66]) translate([26.4, 18.85, 58.75]) rotate([90, 0, 0]) pin_washer();
  color([0.85, 0.48, 0.18]) translate([26.4, 26.1, 58.75]) rotate([90, 0, 0]) lock_nut();
  color([0.55, 0.60, 0.65]) translate([-36, -16.8, 12.25]) rotate([0, 0, 0]) guide_bush_a();
  color([0.75, 0.30, 0.55]) translate([-36, 16.8, 12.25]) rotate([0, 0, 0]) guide_bush_b();
}

assembly();
